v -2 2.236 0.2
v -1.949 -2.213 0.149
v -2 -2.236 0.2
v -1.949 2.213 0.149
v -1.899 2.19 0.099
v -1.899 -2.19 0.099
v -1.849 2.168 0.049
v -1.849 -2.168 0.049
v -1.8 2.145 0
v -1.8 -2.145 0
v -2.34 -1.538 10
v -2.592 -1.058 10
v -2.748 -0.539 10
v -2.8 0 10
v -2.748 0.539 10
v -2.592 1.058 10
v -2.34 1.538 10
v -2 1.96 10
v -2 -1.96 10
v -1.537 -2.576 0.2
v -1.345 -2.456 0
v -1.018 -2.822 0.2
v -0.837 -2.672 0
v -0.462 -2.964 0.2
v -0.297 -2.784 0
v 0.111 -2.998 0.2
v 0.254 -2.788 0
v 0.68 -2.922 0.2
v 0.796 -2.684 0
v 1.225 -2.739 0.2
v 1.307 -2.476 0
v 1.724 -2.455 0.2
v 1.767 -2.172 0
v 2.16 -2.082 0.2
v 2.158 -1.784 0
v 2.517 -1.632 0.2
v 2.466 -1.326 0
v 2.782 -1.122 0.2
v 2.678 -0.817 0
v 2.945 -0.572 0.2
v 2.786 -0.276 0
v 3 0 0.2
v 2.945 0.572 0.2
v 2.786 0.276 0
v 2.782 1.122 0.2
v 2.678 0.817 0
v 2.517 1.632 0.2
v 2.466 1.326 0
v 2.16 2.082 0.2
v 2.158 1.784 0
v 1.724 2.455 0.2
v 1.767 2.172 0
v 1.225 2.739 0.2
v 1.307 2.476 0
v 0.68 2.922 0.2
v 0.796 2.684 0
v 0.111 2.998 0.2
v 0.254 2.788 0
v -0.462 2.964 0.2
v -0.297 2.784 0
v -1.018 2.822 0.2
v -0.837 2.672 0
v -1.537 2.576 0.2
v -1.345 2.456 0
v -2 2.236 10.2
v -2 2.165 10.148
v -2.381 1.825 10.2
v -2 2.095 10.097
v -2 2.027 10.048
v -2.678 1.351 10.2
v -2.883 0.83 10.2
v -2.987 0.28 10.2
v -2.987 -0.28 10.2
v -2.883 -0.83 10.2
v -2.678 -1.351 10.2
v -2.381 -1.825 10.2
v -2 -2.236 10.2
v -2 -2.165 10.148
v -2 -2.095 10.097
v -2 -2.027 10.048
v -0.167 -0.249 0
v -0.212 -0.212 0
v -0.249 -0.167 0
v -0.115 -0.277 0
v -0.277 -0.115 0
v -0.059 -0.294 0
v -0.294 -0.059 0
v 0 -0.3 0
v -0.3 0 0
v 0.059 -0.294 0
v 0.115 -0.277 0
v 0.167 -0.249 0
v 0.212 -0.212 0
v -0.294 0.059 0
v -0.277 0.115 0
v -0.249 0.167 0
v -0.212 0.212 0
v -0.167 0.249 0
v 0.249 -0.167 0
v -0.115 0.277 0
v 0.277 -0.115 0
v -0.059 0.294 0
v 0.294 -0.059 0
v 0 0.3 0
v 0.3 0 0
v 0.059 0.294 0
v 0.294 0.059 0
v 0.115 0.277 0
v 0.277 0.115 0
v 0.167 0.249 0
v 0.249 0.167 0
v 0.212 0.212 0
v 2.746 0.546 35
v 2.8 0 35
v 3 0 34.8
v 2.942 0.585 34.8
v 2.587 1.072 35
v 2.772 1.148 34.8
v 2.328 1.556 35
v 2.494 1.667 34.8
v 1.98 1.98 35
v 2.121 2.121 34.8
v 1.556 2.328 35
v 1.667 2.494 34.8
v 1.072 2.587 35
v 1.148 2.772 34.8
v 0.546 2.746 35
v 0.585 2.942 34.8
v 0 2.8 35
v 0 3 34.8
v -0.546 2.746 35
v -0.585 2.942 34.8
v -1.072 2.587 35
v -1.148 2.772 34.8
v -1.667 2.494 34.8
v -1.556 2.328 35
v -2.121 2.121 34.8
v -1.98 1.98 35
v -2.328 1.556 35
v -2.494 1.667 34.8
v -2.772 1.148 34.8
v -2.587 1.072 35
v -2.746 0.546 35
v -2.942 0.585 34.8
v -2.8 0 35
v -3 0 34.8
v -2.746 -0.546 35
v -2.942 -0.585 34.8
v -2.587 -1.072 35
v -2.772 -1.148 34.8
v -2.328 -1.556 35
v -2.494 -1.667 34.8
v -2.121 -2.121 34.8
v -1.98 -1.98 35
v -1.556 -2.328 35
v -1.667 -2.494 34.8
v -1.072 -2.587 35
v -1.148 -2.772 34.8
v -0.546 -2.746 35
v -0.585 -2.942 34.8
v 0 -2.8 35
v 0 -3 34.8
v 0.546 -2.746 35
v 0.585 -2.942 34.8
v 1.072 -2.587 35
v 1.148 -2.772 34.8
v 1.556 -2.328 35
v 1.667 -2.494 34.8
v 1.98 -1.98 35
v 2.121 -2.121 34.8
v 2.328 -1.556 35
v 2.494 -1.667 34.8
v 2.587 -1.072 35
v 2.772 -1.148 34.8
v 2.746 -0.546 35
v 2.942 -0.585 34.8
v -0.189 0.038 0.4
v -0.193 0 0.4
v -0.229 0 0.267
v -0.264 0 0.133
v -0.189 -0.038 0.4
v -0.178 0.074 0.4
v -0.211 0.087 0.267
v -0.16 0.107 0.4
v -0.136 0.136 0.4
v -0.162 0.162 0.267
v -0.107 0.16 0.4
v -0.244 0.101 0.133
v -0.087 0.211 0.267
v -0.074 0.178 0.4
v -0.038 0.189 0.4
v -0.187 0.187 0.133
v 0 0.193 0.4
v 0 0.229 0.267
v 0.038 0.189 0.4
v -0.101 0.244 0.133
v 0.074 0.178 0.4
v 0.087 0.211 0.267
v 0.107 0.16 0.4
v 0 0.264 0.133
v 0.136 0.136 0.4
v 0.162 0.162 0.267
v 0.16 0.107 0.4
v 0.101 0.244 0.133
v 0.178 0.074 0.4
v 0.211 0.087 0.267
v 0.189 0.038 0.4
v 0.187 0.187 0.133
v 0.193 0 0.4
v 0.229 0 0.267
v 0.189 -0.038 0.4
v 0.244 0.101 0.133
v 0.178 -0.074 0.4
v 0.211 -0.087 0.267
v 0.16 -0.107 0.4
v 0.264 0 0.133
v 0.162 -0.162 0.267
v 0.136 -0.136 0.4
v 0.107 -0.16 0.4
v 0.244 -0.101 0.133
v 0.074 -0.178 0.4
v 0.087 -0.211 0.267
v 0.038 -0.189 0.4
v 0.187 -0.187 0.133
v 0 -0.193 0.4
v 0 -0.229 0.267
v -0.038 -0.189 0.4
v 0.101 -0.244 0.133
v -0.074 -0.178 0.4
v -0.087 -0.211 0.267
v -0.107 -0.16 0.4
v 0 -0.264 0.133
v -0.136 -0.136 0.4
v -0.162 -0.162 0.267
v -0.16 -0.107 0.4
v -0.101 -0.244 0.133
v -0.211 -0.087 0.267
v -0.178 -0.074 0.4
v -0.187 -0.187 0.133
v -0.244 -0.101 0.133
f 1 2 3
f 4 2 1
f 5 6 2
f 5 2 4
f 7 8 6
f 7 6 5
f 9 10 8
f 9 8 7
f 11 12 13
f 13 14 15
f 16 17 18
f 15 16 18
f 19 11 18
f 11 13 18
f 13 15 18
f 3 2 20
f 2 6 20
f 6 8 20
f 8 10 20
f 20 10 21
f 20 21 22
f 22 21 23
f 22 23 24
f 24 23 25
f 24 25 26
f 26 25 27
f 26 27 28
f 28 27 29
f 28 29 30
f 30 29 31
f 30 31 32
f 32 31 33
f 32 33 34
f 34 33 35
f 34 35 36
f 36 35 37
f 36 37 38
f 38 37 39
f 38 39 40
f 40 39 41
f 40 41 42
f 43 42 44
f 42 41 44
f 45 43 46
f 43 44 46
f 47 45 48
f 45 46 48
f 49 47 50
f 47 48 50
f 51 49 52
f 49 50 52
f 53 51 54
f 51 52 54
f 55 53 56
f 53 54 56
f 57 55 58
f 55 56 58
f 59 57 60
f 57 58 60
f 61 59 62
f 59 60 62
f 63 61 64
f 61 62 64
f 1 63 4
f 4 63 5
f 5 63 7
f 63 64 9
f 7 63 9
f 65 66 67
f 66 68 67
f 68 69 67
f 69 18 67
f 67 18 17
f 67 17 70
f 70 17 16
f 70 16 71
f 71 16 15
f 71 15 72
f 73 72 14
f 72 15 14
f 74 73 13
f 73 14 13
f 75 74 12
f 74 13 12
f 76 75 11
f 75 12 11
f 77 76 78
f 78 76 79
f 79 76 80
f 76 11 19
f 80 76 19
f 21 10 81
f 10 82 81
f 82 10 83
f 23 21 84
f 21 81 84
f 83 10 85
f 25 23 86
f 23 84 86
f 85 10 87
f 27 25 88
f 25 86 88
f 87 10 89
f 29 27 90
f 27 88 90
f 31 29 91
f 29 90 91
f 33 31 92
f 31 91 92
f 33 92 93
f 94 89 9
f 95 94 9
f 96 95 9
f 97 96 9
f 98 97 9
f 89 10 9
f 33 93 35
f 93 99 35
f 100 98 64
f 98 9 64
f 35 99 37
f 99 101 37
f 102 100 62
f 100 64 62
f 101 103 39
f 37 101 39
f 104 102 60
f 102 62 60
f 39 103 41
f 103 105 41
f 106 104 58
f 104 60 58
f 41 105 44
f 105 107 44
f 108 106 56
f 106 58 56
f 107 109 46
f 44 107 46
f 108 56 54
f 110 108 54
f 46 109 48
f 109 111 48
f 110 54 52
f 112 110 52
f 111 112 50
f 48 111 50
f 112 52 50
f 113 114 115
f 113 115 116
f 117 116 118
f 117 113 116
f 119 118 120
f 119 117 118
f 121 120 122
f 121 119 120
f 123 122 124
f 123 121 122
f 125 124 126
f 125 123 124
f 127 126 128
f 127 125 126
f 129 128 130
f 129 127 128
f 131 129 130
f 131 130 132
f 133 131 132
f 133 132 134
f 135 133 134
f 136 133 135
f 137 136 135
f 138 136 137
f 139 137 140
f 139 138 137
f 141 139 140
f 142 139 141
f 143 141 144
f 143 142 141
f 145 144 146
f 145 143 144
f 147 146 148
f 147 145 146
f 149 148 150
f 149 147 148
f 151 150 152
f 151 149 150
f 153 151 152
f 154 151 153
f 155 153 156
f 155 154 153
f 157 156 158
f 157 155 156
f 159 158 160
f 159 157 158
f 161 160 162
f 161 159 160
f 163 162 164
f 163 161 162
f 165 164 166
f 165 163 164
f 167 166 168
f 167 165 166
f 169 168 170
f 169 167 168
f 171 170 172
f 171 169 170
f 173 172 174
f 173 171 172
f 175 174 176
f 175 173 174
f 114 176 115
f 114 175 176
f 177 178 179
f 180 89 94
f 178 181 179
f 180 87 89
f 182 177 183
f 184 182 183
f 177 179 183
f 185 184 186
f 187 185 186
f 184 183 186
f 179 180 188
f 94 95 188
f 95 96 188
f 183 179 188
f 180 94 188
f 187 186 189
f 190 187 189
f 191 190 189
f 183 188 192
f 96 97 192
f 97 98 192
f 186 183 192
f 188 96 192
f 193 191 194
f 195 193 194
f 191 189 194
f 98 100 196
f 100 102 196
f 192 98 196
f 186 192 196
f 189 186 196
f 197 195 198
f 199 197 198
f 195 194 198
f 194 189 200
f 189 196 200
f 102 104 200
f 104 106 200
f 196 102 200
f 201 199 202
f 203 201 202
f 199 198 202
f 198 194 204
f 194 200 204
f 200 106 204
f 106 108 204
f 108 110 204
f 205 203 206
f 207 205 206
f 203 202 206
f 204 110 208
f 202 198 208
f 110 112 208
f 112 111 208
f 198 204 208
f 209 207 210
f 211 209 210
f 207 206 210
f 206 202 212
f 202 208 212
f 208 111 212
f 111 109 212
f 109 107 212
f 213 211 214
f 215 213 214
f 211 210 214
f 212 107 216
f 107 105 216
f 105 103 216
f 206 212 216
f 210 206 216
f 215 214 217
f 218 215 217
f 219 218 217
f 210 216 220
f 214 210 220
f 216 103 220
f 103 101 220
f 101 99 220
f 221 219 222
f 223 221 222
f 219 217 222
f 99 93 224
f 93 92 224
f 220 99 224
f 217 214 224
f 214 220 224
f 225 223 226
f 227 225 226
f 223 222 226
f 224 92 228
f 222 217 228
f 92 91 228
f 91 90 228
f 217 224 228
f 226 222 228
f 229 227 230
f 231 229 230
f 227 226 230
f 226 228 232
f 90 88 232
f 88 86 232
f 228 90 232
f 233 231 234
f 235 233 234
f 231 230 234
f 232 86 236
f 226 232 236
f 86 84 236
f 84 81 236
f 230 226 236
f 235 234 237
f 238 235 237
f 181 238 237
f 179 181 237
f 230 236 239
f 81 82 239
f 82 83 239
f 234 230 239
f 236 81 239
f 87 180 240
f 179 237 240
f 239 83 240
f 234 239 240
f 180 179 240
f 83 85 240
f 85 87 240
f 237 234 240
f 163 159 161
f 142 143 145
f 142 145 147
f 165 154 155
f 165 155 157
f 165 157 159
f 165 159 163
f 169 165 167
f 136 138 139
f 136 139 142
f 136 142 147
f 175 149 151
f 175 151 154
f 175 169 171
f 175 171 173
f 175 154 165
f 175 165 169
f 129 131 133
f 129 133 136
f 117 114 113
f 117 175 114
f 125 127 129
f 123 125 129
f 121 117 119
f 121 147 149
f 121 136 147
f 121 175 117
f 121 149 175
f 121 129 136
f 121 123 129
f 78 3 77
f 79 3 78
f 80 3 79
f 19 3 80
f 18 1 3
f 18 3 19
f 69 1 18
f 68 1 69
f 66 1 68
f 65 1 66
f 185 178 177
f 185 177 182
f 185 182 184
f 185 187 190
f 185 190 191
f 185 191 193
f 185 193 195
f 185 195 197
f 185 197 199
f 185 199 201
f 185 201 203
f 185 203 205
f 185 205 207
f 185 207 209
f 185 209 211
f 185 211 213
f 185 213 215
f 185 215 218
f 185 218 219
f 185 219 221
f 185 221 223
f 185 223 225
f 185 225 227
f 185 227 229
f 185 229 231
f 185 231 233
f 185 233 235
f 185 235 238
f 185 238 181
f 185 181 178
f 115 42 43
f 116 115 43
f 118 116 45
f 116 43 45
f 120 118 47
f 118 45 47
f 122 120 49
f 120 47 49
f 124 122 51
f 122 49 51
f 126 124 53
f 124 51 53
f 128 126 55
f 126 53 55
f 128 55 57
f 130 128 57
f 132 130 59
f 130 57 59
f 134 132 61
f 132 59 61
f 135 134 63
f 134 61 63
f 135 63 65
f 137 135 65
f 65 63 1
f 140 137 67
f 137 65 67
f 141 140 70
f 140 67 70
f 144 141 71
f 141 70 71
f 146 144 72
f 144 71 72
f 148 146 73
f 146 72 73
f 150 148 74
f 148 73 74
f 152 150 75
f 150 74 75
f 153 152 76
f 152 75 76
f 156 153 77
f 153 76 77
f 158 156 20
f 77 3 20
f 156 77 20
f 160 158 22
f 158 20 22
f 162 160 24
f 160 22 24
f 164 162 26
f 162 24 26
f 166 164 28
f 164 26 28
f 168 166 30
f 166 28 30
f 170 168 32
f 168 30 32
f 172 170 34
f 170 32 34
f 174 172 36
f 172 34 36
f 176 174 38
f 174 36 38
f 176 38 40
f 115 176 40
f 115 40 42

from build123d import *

# Parameters (mm, degrees)
SKETCH1_R           = 3
BOSS_EXTRUDE1_DEPTH = 35
SKETCH2_W           = 10
SKETCH2_H           = 6
CUT_EXTRUDE1_DEPTH  = 1
CHAMFER1_SIZE       = 0.2
SKETCH3_R           = 0.3
CUT_EXTRUDE2_DEPTH  = 0.4
CUT_EXTRUDE2_DRAFT  = -15


with BuildPart() as part:
    # Sketch1 → Boss-Extrude1 (new body)
    with BuildSketch(Plane.XY):
        Circle(SKETCH1_R)
    extrude(amount=BOSS_EXTRUDE1_DEPTH)

    # Sketch2 → Cut-Extrude1 (cut)
    with BuildSketch(Plane.ZY.offset(3)):
        with Locations((5, 0)):
            Rectangle(SKETCH2_W, SKETCH2_H)
    extrude(amount=-CUT_EXTRUDE1_DEPTH, mode=Mode.SUBTRACT)

    # Chamfer1
    chamfer1_edges = [part.edges().sort_by_distance(p)[0] for p in [
        (1.224744871, 2.738612788, 0),
        (-2, 0, 0),
        (-3, 0, 10),
        (-3, 0, 35),
    ]]
    chamfer(chamfer1_edges, length=CHAMFER1_SIZE)


with BuildPart() as cut_extrude2_tool:
    # Sketch3 → Cut-Extrude2 (with draft: the straight prism first)
    with BuildSketch(Plane(origin=(0, 0, 0), x_dir=(-1, 0, 0), z_dir=(0, 0, -1))):
        Circle(SKETCH3_R)
    extrude(amount=-CUT_EXTRUDE2_DEPTH)
    # Cut-Extrude2: the draft: its side faces are tilted about the plane it starts from
    cut_extrude2_sides = [cut_extrude2_tool.faces().sort_by_distance(p)[0] for p in [
        (0.3, 0, 0.2),
    ]]
    draft(cut_extrude2_sides, Plane(origin=(0, 0, 0), x_dir=(-1, 0, 0), z_dir=(0, 0, -1)), CUT_EXTRUDE2_DRAFT)


with BuildPart() as part_1:
    add(part.part)

    # Cut-Extrude2: cut by cut_extrude2_tool
    add(cut_extrude2_tool.part, mode=Mode.SUBTRACT)


solid = part_1.part
